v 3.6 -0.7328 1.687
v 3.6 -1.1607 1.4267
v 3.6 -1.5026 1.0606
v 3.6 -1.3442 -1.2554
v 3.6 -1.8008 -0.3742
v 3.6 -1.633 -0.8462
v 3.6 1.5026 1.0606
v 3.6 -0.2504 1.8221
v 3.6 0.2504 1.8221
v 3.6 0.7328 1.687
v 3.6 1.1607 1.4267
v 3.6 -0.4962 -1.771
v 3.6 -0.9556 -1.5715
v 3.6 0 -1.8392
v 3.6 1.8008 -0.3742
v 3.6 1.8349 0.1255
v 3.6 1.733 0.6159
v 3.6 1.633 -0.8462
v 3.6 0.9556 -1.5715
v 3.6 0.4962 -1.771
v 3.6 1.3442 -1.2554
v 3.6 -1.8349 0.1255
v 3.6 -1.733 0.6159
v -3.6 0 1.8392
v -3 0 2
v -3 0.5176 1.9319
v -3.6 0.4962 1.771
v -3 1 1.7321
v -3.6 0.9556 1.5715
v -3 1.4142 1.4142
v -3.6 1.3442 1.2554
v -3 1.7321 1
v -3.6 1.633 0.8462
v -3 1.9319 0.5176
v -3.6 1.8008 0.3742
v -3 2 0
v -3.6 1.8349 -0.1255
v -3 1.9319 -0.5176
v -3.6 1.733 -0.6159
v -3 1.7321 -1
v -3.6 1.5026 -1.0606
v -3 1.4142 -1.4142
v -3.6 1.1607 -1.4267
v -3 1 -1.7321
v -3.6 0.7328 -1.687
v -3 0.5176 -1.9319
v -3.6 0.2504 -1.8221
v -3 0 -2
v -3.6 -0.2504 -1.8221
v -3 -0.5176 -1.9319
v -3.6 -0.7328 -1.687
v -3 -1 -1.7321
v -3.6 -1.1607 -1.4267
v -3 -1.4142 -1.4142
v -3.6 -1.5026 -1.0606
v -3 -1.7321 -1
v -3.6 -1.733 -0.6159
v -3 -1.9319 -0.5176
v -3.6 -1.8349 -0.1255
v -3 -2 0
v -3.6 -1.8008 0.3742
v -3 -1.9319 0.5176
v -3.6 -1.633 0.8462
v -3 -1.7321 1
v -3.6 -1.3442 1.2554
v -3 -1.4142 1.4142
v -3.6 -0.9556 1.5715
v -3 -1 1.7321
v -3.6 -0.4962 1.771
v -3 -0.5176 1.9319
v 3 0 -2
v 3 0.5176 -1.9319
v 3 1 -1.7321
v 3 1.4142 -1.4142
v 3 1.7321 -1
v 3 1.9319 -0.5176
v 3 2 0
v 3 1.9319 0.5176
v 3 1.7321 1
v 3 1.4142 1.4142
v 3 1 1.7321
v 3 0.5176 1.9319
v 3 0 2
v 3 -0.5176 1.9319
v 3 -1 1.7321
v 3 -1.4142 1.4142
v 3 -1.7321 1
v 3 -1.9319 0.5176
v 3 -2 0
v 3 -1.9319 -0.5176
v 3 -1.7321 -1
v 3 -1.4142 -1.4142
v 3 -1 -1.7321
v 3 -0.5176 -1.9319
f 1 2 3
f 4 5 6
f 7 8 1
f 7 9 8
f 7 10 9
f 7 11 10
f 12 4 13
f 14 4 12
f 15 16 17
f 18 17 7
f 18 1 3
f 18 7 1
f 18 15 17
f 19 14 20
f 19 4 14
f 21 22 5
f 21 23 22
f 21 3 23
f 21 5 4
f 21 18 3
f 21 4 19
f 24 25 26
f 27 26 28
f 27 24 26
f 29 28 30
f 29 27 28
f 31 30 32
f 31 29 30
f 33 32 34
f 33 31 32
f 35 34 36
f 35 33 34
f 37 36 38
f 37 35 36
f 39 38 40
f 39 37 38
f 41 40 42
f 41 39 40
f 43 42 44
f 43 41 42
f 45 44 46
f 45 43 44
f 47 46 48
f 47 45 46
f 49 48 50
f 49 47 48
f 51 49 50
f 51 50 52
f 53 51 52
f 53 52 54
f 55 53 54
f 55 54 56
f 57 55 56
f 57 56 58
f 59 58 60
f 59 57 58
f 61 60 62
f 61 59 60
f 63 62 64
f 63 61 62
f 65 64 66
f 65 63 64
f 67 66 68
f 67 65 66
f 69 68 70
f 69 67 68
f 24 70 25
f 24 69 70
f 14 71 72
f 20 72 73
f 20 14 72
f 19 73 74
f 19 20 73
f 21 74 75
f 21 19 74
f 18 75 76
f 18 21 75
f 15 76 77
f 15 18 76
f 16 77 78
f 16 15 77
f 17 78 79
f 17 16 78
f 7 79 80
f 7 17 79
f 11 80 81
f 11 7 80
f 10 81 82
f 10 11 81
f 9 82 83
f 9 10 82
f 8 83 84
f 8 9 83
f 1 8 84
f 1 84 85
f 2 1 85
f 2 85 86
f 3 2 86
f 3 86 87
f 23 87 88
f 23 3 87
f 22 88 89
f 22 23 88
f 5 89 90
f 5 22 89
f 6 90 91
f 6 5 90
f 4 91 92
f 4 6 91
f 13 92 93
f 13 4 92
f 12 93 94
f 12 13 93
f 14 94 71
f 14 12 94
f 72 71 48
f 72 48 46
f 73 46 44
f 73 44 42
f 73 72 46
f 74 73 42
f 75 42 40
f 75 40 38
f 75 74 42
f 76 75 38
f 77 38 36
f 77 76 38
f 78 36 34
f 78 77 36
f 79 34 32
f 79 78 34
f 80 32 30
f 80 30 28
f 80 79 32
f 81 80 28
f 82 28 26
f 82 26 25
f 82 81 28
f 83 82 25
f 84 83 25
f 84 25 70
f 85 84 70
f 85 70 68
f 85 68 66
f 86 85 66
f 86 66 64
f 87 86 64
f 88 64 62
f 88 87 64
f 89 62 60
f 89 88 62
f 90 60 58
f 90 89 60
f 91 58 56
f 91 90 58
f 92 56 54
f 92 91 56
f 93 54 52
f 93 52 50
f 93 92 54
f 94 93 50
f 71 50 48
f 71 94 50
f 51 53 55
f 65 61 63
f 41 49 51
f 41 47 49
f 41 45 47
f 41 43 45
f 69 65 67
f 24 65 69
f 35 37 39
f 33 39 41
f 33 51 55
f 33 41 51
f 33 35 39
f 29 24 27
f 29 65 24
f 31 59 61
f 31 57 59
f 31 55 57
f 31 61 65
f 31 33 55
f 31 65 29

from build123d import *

# Parameters (mm, degrees)
SKETCH2_R           = 2
EXTRUDE1_DEPTH      = 3
EXTRUDE1_DEPTH_BACK = 3
SKETCH3_R           = 2
EXTRUDE2_DEPTH      = 0.6
EXTRUDE2_TAPER      = 15
SKETCH4_R           = 2
EXTRUDE3_DEPTH      = 0.6
EXTRUDE3_TAPER      = 15


with BuildPart() as part:
    # Sketch2 → Extrude1 (new body, two sides)
    with BuildSketch(Plane(origin=(0, 0, 0), x_dir=(0, 0, -1), z_dir=(1, 0, 0))) as extrude1_sk:
        Circle(SKETCH2_R)
    extrude(amount=EXTRUDE1_DEPTH)
    extrude(extrude1_sk.sketch, amount=-EXTRUDE1_DEPTH_BACK)

    # Sketch3 → Extrude2 (add)
    with BuildSketch(Plane(origin=(3, 0, 0), x_dir=(0, 0, -1), z_dir=(1, 0, 0))):
        Circle(SKETCH3_R)
    extrude(amount=EXTRUDE2_DEPTH, taper=EXTRUDE2_TAPER)

    # Sketch4 → Extrude3 (add)
    with BuildSketch(Plane.ZY.offset(3)):
        Circle(SKETCH4_R)
    extrude(amount=EXTRUDE3_DEPTH, taper=EXTRUDE3_TAPER)


solid = part.part
